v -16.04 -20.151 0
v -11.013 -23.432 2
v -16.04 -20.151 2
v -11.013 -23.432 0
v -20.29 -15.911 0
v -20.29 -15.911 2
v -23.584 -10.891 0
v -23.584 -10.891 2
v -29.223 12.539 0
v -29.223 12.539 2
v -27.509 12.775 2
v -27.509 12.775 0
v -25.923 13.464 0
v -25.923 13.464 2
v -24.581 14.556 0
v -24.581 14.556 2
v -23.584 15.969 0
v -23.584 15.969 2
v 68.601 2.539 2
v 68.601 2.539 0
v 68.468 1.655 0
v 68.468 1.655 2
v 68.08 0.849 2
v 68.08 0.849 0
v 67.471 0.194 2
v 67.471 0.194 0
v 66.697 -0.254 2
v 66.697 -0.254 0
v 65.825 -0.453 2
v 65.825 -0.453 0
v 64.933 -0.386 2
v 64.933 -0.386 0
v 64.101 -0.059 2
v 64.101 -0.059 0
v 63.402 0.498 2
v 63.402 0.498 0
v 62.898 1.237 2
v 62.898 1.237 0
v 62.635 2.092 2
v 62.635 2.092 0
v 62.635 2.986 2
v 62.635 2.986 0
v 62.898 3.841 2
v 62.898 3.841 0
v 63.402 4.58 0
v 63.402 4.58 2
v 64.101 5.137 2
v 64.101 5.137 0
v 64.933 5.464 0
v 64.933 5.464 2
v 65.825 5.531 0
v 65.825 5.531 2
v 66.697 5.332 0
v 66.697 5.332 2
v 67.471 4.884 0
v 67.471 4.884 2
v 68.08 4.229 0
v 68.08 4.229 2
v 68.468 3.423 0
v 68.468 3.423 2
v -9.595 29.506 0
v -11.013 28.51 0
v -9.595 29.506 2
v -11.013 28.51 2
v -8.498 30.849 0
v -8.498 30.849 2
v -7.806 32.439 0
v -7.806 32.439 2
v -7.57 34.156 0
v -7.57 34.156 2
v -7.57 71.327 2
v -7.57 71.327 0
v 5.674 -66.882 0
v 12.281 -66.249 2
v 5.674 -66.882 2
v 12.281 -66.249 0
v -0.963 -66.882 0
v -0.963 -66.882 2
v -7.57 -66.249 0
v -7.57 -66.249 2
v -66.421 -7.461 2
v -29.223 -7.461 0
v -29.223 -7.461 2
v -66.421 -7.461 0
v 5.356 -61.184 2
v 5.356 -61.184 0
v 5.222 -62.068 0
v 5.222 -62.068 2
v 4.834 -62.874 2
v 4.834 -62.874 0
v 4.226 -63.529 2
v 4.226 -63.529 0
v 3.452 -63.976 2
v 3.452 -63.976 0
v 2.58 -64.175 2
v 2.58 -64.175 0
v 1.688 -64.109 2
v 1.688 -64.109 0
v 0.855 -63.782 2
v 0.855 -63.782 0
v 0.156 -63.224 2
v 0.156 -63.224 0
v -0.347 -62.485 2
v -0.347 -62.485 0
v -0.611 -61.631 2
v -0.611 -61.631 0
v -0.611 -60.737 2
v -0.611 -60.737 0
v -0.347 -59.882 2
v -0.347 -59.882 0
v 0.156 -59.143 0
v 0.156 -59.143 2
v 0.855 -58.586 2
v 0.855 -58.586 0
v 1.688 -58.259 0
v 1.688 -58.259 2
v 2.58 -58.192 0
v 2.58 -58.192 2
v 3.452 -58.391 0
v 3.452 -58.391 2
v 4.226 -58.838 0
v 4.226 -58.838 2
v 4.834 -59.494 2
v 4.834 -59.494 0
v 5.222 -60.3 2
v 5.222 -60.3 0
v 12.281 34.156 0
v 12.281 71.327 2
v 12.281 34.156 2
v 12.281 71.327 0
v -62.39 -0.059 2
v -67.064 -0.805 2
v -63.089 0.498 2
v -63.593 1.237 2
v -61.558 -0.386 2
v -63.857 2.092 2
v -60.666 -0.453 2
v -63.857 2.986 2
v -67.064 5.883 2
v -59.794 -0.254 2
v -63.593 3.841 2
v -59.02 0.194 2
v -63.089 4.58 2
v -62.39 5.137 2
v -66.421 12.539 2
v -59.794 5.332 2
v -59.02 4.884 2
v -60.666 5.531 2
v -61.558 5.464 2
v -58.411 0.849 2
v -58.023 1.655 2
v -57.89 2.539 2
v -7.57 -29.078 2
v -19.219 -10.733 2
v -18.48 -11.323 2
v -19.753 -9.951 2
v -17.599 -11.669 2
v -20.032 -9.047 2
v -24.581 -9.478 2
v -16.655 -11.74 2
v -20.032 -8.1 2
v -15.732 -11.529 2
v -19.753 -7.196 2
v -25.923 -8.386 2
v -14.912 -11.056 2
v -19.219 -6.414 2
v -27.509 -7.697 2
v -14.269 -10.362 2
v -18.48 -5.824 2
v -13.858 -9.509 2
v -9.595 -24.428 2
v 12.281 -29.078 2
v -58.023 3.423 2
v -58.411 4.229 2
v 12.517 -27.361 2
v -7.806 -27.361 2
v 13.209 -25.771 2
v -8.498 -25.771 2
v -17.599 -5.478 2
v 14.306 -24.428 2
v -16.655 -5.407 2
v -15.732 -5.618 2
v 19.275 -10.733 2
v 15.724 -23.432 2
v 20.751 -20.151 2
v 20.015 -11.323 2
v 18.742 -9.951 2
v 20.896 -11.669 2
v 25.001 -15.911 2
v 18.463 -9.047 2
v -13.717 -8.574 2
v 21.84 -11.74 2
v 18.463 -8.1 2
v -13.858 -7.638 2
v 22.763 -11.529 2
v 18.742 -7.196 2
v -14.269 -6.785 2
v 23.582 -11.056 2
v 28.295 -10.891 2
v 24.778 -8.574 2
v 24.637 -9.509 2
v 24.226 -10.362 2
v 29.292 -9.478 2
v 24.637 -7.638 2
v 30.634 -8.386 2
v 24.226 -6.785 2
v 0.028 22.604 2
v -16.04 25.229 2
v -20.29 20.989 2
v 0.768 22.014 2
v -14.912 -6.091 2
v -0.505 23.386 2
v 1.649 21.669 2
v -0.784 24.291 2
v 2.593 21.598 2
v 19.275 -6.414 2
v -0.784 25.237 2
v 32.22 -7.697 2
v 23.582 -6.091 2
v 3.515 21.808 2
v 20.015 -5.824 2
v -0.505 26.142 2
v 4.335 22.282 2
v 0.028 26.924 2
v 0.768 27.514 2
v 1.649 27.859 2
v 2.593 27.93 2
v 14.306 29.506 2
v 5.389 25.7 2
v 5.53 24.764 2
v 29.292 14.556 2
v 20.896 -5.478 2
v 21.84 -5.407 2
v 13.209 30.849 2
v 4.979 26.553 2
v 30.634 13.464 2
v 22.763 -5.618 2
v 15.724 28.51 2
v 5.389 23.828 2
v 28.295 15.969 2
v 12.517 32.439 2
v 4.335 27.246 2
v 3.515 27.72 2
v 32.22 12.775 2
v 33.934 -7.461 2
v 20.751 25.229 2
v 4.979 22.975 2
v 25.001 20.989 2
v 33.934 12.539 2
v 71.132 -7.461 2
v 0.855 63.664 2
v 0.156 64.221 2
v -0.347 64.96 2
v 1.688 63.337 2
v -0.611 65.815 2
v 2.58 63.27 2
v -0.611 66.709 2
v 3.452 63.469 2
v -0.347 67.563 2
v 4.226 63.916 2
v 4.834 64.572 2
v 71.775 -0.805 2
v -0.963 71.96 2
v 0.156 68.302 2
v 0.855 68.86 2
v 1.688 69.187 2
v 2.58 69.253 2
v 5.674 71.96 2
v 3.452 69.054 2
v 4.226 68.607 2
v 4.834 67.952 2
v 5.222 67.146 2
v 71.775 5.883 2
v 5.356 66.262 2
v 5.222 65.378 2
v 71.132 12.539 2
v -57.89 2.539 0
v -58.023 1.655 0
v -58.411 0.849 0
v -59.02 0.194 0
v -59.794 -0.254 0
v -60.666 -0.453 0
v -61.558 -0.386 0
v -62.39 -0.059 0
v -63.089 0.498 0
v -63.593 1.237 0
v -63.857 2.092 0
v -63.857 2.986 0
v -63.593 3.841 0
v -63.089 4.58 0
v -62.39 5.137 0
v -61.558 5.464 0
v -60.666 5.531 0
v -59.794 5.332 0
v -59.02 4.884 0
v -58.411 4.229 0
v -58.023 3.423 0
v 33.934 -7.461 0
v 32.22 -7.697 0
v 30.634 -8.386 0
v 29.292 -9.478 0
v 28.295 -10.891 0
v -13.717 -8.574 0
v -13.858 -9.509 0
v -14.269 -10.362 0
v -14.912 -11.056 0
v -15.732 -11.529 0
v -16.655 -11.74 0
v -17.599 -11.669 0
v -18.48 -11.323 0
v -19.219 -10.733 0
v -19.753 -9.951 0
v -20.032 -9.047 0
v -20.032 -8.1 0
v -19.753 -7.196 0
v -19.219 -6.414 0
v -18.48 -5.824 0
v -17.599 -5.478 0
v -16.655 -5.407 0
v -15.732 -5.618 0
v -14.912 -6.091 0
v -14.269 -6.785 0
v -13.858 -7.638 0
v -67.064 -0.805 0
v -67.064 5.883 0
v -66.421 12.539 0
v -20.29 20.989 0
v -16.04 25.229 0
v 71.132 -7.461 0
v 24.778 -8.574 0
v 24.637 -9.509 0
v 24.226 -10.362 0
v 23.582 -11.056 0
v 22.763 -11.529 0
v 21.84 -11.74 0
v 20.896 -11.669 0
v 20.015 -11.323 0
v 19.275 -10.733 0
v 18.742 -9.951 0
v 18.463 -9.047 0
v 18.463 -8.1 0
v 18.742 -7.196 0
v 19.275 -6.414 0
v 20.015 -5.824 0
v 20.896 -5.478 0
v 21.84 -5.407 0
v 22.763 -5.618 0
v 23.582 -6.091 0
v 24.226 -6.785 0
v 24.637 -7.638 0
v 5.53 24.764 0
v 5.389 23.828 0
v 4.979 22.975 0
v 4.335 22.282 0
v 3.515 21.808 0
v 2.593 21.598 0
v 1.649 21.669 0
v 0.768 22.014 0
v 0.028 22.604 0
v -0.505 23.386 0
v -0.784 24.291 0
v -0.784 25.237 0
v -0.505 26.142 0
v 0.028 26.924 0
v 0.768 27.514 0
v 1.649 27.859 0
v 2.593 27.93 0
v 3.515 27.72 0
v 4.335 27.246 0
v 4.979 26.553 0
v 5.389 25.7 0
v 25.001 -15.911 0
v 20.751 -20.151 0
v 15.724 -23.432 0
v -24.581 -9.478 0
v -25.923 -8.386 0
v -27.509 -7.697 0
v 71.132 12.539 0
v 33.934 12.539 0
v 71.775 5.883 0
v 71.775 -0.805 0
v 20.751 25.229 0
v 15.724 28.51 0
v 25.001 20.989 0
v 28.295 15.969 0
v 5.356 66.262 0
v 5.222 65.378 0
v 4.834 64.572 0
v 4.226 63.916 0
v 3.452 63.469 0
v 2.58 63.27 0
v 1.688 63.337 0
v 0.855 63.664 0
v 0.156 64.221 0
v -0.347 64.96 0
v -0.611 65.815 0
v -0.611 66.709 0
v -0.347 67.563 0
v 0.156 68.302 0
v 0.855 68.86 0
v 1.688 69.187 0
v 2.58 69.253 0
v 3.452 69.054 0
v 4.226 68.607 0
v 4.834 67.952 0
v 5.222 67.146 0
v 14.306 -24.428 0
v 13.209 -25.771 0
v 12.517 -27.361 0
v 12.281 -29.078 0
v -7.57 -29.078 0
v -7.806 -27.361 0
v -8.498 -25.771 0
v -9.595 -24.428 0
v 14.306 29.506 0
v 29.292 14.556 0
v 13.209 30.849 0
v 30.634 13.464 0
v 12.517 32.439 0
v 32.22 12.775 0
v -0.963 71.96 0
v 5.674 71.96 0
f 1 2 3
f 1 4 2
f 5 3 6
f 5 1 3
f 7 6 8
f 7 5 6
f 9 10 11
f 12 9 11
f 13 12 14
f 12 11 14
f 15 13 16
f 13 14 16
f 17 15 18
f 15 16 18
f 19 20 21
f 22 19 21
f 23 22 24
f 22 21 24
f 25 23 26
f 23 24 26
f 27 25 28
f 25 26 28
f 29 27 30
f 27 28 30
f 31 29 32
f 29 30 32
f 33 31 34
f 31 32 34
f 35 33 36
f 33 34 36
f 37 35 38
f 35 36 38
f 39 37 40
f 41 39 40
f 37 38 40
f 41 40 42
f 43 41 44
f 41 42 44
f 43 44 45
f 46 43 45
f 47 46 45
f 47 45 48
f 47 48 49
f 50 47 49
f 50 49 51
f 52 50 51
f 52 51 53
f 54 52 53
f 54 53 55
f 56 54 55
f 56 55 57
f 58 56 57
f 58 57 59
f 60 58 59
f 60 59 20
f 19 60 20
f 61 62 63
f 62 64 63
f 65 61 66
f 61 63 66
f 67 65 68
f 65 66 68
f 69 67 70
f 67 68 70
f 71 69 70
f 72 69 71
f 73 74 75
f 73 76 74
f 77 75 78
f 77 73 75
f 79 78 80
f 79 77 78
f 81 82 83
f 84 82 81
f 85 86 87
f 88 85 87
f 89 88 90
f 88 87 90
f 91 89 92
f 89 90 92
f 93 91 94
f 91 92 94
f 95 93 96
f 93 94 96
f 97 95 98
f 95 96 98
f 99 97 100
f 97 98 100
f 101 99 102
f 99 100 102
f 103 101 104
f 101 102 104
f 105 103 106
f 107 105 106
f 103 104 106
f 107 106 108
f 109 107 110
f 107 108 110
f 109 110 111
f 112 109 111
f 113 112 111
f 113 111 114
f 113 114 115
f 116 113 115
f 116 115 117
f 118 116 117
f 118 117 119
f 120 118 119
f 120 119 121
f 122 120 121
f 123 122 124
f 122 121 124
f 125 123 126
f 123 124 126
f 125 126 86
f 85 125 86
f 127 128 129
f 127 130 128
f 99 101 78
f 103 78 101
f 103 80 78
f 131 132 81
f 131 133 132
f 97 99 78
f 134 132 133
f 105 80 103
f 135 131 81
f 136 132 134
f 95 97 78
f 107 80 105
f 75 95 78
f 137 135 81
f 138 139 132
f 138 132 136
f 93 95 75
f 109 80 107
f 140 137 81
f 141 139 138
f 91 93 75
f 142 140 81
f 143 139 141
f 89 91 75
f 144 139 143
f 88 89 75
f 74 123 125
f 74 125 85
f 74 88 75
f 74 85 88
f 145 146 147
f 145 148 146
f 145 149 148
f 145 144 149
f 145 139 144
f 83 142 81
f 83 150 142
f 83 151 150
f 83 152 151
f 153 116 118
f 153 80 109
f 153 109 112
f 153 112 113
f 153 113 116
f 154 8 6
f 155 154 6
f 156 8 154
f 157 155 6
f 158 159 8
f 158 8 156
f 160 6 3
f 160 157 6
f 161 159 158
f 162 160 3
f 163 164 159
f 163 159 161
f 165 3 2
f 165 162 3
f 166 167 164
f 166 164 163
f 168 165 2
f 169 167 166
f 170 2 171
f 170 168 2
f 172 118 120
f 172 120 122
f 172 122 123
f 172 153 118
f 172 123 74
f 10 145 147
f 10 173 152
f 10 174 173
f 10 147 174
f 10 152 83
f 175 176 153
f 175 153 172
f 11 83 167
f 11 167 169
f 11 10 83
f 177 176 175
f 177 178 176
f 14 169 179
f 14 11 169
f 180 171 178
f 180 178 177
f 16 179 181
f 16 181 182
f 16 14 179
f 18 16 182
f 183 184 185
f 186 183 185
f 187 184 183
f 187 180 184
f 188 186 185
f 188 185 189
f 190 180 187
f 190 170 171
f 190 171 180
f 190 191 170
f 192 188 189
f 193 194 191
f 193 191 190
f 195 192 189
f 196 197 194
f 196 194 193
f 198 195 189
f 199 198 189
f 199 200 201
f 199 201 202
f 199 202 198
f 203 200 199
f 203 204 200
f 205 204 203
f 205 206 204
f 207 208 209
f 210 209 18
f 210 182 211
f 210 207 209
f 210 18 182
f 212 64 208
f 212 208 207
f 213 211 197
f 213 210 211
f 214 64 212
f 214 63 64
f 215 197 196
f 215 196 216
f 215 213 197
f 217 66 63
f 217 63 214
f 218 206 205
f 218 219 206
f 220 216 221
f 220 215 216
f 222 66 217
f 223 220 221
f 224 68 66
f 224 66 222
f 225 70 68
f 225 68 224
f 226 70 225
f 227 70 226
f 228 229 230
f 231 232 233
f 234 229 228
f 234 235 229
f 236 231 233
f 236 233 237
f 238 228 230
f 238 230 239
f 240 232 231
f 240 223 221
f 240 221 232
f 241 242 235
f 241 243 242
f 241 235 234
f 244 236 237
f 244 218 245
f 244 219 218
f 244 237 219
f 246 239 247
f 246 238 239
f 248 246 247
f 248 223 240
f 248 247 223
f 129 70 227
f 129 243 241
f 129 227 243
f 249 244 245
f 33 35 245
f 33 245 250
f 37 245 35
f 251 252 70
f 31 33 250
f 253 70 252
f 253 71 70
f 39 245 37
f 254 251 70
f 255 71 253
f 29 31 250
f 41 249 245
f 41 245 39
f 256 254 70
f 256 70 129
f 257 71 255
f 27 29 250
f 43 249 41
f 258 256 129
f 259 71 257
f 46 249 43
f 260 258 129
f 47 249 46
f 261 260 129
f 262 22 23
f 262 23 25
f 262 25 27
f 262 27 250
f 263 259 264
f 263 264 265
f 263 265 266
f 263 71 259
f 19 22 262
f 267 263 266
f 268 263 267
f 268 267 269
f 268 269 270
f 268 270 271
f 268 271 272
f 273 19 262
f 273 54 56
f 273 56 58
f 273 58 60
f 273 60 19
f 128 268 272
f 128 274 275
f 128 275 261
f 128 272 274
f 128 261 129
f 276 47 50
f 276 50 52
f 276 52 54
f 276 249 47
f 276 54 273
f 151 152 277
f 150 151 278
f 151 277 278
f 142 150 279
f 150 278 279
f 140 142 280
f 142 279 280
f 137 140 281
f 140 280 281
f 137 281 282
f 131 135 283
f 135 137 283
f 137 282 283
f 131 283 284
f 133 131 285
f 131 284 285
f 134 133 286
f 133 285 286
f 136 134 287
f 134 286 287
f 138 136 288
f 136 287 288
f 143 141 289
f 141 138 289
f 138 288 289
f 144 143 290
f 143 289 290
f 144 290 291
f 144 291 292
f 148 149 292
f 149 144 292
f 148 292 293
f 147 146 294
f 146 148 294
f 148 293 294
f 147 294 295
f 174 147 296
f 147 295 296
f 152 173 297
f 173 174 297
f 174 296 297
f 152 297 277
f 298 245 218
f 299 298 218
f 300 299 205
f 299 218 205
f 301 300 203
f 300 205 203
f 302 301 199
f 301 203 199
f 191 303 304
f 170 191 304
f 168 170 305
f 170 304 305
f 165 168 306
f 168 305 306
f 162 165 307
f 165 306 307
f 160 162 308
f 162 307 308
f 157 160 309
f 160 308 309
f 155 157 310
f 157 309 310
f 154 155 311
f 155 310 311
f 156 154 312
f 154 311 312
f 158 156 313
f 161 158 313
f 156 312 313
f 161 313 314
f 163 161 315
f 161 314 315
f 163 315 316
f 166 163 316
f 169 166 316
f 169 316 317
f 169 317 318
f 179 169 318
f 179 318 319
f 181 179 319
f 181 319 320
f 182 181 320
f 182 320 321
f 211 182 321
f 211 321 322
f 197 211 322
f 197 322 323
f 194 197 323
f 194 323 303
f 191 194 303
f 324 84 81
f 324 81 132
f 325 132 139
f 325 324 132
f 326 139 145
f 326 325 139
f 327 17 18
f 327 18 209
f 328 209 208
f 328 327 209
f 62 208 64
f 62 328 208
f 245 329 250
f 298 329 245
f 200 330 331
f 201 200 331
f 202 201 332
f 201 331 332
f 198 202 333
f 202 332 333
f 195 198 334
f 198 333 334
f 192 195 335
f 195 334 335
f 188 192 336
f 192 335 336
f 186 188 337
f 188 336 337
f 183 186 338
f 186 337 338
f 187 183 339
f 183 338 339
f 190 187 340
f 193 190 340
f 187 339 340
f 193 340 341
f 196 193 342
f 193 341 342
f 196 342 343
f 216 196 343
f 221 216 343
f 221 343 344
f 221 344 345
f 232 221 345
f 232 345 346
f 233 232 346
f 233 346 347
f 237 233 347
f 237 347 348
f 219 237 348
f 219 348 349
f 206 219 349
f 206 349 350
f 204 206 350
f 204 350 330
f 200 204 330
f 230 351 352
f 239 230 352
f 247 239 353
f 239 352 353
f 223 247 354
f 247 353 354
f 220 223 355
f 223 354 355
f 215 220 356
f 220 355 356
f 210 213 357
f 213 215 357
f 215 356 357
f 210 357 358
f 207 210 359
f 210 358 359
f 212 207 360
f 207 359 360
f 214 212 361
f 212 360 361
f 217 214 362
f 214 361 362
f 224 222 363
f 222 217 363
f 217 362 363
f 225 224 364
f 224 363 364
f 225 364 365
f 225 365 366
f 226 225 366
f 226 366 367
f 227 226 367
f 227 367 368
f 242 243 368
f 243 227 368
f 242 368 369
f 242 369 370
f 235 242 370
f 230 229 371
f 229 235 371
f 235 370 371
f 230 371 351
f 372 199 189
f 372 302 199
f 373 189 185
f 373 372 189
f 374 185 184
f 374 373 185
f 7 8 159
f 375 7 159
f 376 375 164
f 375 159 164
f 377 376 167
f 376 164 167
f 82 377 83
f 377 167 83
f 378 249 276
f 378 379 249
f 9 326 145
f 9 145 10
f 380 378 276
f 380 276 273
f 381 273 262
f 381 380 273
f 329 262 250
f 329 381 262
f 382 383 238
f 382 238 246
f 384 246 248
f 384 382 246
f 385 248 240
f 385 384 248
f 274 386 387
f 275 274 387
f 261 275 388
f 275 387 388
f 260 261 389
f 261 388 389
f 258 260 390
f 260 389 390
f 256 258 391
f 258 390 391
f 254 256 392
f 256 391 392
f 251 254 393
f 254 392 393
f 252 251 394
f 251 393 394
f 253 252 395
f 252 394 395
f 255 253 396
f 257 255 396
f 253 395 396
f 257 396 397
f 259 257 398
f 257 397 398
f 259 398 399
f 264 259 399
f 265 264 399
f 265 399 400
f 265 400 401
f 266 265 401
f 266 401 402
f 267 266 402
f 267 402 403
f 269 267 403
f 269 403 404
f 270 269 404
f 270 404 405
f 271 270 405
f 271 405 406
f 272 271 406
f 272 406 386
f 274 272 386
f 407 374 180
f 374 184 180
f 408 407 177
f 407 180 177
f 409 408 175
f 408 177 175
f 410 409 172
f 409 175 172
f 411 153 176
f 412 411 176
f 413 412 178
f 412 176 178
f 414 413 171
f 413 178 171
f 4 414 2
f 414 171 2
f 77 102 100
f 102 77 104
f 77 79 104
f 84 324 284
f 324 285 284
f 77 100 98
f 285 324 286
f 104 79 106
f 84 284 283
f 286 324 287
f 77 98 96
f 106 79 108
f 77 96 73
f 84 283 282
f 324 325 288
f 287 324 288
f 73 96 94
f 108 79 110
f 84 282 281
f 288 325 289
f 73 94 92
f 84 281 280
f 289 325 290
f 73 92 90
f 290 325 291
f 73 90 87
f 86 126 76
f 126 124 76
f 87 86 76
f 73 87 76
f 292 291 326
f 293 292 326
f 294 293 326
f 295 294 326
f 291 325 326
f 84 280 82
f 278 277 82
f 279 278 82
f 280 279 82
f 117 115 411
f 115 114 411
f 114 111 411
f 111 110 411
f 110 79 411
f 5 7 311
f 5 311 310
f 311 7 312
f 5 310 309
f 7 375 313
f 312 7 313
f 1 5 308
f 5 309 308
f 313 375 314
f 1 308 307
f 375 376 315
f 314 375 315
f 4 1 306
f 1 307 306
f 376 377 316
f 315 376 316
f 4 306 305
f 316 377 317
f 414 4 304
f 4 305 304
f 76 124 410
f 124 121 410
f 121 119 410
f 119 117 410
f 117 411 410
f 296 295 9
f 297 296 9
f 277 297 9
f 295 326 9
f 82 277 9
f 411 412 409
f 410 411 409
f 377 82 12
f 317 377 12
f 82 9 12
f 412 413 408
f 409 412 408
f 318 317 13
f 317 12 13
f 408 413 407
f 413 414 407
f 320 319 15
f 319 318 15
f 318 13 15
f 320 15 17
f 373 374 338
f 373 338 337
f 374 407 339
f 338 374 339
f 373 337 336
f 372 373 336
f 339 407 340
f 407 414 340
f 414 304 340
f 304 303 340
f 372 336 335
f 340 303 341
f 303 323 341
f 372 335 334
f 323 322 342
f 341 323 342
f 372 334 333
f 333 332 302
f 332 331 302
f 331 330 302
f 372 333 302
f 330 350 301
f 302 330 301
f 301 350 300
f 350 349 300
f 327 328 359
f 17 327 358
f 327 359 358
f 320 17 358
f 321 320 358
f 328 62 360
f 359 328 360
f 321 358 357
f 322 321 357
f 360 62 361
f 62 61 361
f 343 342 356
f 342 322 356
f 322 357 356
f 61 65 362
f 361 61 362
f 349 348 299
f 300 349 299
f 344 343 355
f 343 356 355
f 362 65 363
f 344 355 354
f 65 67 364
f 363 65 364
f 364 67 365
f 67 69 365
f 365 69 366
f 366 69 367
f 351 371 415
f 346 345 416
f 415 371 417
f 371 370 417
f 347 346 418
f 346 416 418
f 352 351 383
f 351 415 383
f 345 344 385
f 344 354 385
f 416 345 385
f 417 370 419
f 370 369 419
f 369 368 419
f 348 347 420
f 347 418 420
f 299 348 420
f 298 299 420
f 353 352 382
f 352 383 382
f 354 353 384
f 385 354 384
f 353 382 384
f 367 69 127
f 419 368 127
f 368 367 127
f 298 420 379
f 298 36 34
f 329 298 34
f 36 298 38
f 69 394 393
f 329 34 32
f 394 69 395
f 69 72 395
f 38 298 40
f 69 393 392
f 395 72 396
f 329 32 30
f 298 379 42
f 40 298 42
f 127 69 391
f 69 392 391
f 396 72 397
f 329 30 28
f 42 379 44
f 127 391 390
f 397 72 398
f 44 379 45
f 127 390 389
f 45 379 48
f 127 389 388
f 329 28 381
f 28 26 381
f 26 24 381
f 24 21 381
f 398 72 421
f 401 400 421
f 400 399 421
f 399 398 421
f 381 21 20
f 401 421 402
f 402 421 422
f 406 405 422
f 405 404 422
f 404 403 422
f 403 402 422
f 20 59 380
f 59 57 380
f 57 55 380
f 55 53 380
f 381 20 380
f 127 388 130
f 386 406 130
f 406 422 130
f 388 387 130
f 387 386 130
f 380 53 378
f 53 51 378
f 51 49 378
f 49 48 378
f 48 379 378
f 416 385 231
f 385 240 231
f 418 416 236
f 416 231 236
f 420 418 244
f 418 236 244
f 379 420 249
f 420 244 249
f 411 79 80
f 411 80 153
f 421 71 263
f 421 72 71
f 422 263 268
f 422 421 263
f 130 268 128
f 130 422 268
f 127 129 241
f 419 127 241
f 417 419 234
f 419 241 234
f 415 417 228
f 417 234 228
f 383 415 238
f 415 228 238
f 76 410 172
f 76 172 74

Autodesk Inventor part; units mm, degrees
ref_plane "YZ Plane" through (0, 0, 0) normal (1, 0, 0) x (0, 1, 0)
ref_plane "XZ Plane" through (0, 0, 0) normal (0, 1, 0) x (-1, 0, 0)
ref_plane "XY Plane" through (0, 0, 0) normal (0, 0, 1) x (1, 0, 0)
sketch "Sketch1" plane through (0, 0, 0) normal (0, 0, 1) x (1, 0, 0)
  line L0 (-60.8901, 2.539) -> (2.3555, 66.2618)
  line L1 (2.3555, 66.2618) -> (65.601, 2.539)
  line L2 (65.601, 2.539) -> (2.3555, -61.1838)
  line L3 (2.3555, -61.1838) -> (-60.8901, 2.539)
  circle A0 centre (2.3555, 66.2618) radius 3
  circle A1 centre (-60.8901, 2.539) radius 3
  circle A2 centre (2.3555, -61.1838) radius 3
  circle A3 centre (65.601, 2.539) radius 3
  line L4 (-2.6445, 61.2618) -> (7.3555, 71.2618) construction
  line L5 (7.3555, 61.2618) -> (-2.6445, 71.2618) construction
  line L6 (-65.8901, -2.461) -> (-55.8901, 7.539) construction
  line L7 (-55.8901, -2.461) -> (-65.8901, 7.539) construction
  circle A4 centre (2.3555, 2.539) radius 100
  circle A5 centre (2.3555, 2.539) radius 70
  line L8 (65.601, 2.539) -> (-60.889, 2.539)
  line L9 (-70.889, -7.461) -> (-70.889, 12.539)
  line L10 (-70.889, 12.539) -> (-50.889, 12.539)
  line L11 (-50.889, 12.539) -> (-50.889, -7.461)
  line L12 (-50.889, -7.461) -> (-70.889, -7.461)
  line L13 (-70.889, -7.461) -> (-50.889, 12.539) construction
  line L14 (-70.889, 12.539) -> (-50.889, -7.461) construction
  line L15 (55.601, -7.461) -> (55.601, 12.539)
  line L16 (55.601, 12.539) -> (75.601, 12.539)
  line L17 (75.601, 12.539) -> (75.601, -7.461)
  line L18 (75.601, -7.461) -> (55.601, -7.461)
  line L19 (55.601, -7.461) -> (75.601, 12.539) construction
  line L20 (55.601, 12.539) -> (75.601, -7.461) construction
  line L21 (2.3555, 66.2618) -> (2.3555, 56.2618)
  line L22 (2.3555, 56.2618) -> (-7.5696, 56.2618)
  line L23 (-7.5696, 56.2618) -> (-7.5696, 71.8318)
  line L24 (2.3555, 56.2618) -> (12.2806, 56.2618)
  line L25 (12.2806, 56.2618) -> (12.2806, 71.8318)
  line L26 (2.3555, -61.1838) -> (2.3555, -51.1838)
  line L27 (2.3555, -51.1838) -> (-7.5696, -51.1838)
  line L28 (-7.5696, -66.7538) -> (-7.5696, -51.1838)
  line L29 (2.3555, -51.1838) -> (12.2806, -51.1838)
  line L30 (12.2806, -51.1838) -> (12.2806, -66.7538)
  line L31 (-50.965, 12.539) -> (55.601, 12.539)
  line L32 (55.601, 12.539) -> (55.601, -7.461)
  line L33 (55.601, -7.461) -> (-50.965, -7.461)
  line L34 (-50.965, -7.461) -> (-50.965, 12.539)
  line L35 (12.2806, -51.1838) -> (-7.5696, -51.1838)
  line L36 (-7.5696, -51.1838) -> (-7.5696, 56.2618)
  line L37 (-7.5696, 56.2618) -> (12.2806, 56.2618)
  line L38 (12.2806, 56.2618) -> (12.2806, -51.1838)
  circle A6 centre (2.3555, 2.539) radius 69.5
  circle A7 centre (2.3555, 2.539) radius 7
  line L39 (2.3555, 2.539) -> (24.5805, 2.539)
  circle A8 centre (24.5805, 2.539) radius 2
  line L40 (2.3555, 2.539) -> (21.6029, -8.5735)
  circle A9 centre (2.3555, 2.539) radius 29.21
  circle A10 centre (21.6029, -8.5735) radius 3.175
  circle A11 centre (2.3555, 24.764) radius 3.175
  circle A12 centre (-16.892, -8.5735) radius 3.175
  point P0 (0, 0)
  point P1 (-60.8901, 2.539)
  point P2 (-66.9266, 12.539)
  point P3 (-66.9266, -7.461)
  point P4 (-50.965, -7.461)
  point P5 (12.2806, 12.539)
  point P6 (-7.5696, 12.539)
  point P7 (-50.889, -7.461)
  point P8 (-7.5696, -7.461)
  point P9 (12.2806, -7.461)
  point P10 (71.6375, -7.461)
  point P11 (71.6375, 12.539)
  point P12 (12.2806, 71.3266)
  point P13 (-7.5696, 71.3266)
  point P14 (-7.5696, -66.2487)
  point P15 (12.2806, -66.2487)
  point P16 (71.1323, -7.461)
  point P17 (71.1323, 12.539)
  point P18 (-66.4214, 12.539)
  point P19 (-66.4214, -7.461)
  point P20 (-7.5696, 30.0111)
  point P21 (-25.0895, 12.539)
  point P22 (-25.0895, -7.461)
  point P23 (-7.5696, -24.9331)
  point P24 (12.2806, -24.9331)
  point P25 (29.8004, -7.461)
  point P26 (29.8004, 12.539)
  point P27 (12.2806, 30.0111)
  dimension "d0" = 6
  dimension "d1" = 6
  dimension "d2" = 6
  dimension "d3" = 6
  dimension "d8" = 200
  dimension "d9" = 140
  dimension "d10" = 126.49
  dimension "d11" = 20
  dimension "d12" = 20
  dimension "d13" = 20
  dimension "d14" = 20
  dimension "d18" = 10
  dimension "d19" = 10
  dimension "d22" = 139
  dimension "d24" = 14
  dimension "d25" = 22.225
  dimension "d26" = 4
  dimension "d31" = 22.225
  dimension "d32" = 30
  dimension "d33" = 58.42
  dimension "d34" = 6.35
  dimension "d37" = 360
extrude "Extrusion1" add sketch "Sketch1" along normal blind 2 contours L34 L8 A1 L0 | L0 A1 L3 L12 A6 L10 | L10 L11 L8 L34 | L23 A6 L25 L1 A0 L0 | L0 A0 L21 L22 | L22 L24 L38 A9 L36 | L31 A9 L8 L11 | L34 L3 A1 L8 | L8 L11 L12 L34 | L21 A0 L1 L24 | A9 L38 L31 L36 | L36 L31 A9 | L8 A9 L33 L11 | L31 L36 L8 A9 | L31 L38 L8 A7 L36 | A9 L31 L38 | L8 L36 L33 A12 A9 | L28 L3 A2 L2 L30 A6 | L27 L26 A2 L3 | L36 A9 L38 L29 L27 | L16 A6 L18 L2 A3 L1 | L1 A3 L8 L15 L16 | L31 A9 L8 A8 L38 | L8 A7 L40 L38 L33 L36 | L31 L15 L8 A9 | L33 A12 L36 A9 | L29 L2 A2 L26 | L36 L33 L38 A9 | L38 L40 A7 L8 | L8 A8 A9 L33 A10 L40 L38 | A7 L8 | L8 L40 A7 | L8 L15 L33 A9 | L38 L33 A10 A9 | A3 L2 L18 L15 L8 | A8 L8 | L8 A8 | A7 L40 L8 | L40 A10 L33 L38
fillet "Fillet2" radius 6.35 8 edges at (29.8004, 12.539, 1) (12.2806, 30.0111, 1) (-25.0895, 12.539, 1) (-7.5696, 30.0111, 1) (-7.5696, -24.9331, 1) (-25.0895, -7.461, 1) (12.2806, -24.9331, 1) (29.8004, -7.461, 1)
properties part number "steering sheet"
